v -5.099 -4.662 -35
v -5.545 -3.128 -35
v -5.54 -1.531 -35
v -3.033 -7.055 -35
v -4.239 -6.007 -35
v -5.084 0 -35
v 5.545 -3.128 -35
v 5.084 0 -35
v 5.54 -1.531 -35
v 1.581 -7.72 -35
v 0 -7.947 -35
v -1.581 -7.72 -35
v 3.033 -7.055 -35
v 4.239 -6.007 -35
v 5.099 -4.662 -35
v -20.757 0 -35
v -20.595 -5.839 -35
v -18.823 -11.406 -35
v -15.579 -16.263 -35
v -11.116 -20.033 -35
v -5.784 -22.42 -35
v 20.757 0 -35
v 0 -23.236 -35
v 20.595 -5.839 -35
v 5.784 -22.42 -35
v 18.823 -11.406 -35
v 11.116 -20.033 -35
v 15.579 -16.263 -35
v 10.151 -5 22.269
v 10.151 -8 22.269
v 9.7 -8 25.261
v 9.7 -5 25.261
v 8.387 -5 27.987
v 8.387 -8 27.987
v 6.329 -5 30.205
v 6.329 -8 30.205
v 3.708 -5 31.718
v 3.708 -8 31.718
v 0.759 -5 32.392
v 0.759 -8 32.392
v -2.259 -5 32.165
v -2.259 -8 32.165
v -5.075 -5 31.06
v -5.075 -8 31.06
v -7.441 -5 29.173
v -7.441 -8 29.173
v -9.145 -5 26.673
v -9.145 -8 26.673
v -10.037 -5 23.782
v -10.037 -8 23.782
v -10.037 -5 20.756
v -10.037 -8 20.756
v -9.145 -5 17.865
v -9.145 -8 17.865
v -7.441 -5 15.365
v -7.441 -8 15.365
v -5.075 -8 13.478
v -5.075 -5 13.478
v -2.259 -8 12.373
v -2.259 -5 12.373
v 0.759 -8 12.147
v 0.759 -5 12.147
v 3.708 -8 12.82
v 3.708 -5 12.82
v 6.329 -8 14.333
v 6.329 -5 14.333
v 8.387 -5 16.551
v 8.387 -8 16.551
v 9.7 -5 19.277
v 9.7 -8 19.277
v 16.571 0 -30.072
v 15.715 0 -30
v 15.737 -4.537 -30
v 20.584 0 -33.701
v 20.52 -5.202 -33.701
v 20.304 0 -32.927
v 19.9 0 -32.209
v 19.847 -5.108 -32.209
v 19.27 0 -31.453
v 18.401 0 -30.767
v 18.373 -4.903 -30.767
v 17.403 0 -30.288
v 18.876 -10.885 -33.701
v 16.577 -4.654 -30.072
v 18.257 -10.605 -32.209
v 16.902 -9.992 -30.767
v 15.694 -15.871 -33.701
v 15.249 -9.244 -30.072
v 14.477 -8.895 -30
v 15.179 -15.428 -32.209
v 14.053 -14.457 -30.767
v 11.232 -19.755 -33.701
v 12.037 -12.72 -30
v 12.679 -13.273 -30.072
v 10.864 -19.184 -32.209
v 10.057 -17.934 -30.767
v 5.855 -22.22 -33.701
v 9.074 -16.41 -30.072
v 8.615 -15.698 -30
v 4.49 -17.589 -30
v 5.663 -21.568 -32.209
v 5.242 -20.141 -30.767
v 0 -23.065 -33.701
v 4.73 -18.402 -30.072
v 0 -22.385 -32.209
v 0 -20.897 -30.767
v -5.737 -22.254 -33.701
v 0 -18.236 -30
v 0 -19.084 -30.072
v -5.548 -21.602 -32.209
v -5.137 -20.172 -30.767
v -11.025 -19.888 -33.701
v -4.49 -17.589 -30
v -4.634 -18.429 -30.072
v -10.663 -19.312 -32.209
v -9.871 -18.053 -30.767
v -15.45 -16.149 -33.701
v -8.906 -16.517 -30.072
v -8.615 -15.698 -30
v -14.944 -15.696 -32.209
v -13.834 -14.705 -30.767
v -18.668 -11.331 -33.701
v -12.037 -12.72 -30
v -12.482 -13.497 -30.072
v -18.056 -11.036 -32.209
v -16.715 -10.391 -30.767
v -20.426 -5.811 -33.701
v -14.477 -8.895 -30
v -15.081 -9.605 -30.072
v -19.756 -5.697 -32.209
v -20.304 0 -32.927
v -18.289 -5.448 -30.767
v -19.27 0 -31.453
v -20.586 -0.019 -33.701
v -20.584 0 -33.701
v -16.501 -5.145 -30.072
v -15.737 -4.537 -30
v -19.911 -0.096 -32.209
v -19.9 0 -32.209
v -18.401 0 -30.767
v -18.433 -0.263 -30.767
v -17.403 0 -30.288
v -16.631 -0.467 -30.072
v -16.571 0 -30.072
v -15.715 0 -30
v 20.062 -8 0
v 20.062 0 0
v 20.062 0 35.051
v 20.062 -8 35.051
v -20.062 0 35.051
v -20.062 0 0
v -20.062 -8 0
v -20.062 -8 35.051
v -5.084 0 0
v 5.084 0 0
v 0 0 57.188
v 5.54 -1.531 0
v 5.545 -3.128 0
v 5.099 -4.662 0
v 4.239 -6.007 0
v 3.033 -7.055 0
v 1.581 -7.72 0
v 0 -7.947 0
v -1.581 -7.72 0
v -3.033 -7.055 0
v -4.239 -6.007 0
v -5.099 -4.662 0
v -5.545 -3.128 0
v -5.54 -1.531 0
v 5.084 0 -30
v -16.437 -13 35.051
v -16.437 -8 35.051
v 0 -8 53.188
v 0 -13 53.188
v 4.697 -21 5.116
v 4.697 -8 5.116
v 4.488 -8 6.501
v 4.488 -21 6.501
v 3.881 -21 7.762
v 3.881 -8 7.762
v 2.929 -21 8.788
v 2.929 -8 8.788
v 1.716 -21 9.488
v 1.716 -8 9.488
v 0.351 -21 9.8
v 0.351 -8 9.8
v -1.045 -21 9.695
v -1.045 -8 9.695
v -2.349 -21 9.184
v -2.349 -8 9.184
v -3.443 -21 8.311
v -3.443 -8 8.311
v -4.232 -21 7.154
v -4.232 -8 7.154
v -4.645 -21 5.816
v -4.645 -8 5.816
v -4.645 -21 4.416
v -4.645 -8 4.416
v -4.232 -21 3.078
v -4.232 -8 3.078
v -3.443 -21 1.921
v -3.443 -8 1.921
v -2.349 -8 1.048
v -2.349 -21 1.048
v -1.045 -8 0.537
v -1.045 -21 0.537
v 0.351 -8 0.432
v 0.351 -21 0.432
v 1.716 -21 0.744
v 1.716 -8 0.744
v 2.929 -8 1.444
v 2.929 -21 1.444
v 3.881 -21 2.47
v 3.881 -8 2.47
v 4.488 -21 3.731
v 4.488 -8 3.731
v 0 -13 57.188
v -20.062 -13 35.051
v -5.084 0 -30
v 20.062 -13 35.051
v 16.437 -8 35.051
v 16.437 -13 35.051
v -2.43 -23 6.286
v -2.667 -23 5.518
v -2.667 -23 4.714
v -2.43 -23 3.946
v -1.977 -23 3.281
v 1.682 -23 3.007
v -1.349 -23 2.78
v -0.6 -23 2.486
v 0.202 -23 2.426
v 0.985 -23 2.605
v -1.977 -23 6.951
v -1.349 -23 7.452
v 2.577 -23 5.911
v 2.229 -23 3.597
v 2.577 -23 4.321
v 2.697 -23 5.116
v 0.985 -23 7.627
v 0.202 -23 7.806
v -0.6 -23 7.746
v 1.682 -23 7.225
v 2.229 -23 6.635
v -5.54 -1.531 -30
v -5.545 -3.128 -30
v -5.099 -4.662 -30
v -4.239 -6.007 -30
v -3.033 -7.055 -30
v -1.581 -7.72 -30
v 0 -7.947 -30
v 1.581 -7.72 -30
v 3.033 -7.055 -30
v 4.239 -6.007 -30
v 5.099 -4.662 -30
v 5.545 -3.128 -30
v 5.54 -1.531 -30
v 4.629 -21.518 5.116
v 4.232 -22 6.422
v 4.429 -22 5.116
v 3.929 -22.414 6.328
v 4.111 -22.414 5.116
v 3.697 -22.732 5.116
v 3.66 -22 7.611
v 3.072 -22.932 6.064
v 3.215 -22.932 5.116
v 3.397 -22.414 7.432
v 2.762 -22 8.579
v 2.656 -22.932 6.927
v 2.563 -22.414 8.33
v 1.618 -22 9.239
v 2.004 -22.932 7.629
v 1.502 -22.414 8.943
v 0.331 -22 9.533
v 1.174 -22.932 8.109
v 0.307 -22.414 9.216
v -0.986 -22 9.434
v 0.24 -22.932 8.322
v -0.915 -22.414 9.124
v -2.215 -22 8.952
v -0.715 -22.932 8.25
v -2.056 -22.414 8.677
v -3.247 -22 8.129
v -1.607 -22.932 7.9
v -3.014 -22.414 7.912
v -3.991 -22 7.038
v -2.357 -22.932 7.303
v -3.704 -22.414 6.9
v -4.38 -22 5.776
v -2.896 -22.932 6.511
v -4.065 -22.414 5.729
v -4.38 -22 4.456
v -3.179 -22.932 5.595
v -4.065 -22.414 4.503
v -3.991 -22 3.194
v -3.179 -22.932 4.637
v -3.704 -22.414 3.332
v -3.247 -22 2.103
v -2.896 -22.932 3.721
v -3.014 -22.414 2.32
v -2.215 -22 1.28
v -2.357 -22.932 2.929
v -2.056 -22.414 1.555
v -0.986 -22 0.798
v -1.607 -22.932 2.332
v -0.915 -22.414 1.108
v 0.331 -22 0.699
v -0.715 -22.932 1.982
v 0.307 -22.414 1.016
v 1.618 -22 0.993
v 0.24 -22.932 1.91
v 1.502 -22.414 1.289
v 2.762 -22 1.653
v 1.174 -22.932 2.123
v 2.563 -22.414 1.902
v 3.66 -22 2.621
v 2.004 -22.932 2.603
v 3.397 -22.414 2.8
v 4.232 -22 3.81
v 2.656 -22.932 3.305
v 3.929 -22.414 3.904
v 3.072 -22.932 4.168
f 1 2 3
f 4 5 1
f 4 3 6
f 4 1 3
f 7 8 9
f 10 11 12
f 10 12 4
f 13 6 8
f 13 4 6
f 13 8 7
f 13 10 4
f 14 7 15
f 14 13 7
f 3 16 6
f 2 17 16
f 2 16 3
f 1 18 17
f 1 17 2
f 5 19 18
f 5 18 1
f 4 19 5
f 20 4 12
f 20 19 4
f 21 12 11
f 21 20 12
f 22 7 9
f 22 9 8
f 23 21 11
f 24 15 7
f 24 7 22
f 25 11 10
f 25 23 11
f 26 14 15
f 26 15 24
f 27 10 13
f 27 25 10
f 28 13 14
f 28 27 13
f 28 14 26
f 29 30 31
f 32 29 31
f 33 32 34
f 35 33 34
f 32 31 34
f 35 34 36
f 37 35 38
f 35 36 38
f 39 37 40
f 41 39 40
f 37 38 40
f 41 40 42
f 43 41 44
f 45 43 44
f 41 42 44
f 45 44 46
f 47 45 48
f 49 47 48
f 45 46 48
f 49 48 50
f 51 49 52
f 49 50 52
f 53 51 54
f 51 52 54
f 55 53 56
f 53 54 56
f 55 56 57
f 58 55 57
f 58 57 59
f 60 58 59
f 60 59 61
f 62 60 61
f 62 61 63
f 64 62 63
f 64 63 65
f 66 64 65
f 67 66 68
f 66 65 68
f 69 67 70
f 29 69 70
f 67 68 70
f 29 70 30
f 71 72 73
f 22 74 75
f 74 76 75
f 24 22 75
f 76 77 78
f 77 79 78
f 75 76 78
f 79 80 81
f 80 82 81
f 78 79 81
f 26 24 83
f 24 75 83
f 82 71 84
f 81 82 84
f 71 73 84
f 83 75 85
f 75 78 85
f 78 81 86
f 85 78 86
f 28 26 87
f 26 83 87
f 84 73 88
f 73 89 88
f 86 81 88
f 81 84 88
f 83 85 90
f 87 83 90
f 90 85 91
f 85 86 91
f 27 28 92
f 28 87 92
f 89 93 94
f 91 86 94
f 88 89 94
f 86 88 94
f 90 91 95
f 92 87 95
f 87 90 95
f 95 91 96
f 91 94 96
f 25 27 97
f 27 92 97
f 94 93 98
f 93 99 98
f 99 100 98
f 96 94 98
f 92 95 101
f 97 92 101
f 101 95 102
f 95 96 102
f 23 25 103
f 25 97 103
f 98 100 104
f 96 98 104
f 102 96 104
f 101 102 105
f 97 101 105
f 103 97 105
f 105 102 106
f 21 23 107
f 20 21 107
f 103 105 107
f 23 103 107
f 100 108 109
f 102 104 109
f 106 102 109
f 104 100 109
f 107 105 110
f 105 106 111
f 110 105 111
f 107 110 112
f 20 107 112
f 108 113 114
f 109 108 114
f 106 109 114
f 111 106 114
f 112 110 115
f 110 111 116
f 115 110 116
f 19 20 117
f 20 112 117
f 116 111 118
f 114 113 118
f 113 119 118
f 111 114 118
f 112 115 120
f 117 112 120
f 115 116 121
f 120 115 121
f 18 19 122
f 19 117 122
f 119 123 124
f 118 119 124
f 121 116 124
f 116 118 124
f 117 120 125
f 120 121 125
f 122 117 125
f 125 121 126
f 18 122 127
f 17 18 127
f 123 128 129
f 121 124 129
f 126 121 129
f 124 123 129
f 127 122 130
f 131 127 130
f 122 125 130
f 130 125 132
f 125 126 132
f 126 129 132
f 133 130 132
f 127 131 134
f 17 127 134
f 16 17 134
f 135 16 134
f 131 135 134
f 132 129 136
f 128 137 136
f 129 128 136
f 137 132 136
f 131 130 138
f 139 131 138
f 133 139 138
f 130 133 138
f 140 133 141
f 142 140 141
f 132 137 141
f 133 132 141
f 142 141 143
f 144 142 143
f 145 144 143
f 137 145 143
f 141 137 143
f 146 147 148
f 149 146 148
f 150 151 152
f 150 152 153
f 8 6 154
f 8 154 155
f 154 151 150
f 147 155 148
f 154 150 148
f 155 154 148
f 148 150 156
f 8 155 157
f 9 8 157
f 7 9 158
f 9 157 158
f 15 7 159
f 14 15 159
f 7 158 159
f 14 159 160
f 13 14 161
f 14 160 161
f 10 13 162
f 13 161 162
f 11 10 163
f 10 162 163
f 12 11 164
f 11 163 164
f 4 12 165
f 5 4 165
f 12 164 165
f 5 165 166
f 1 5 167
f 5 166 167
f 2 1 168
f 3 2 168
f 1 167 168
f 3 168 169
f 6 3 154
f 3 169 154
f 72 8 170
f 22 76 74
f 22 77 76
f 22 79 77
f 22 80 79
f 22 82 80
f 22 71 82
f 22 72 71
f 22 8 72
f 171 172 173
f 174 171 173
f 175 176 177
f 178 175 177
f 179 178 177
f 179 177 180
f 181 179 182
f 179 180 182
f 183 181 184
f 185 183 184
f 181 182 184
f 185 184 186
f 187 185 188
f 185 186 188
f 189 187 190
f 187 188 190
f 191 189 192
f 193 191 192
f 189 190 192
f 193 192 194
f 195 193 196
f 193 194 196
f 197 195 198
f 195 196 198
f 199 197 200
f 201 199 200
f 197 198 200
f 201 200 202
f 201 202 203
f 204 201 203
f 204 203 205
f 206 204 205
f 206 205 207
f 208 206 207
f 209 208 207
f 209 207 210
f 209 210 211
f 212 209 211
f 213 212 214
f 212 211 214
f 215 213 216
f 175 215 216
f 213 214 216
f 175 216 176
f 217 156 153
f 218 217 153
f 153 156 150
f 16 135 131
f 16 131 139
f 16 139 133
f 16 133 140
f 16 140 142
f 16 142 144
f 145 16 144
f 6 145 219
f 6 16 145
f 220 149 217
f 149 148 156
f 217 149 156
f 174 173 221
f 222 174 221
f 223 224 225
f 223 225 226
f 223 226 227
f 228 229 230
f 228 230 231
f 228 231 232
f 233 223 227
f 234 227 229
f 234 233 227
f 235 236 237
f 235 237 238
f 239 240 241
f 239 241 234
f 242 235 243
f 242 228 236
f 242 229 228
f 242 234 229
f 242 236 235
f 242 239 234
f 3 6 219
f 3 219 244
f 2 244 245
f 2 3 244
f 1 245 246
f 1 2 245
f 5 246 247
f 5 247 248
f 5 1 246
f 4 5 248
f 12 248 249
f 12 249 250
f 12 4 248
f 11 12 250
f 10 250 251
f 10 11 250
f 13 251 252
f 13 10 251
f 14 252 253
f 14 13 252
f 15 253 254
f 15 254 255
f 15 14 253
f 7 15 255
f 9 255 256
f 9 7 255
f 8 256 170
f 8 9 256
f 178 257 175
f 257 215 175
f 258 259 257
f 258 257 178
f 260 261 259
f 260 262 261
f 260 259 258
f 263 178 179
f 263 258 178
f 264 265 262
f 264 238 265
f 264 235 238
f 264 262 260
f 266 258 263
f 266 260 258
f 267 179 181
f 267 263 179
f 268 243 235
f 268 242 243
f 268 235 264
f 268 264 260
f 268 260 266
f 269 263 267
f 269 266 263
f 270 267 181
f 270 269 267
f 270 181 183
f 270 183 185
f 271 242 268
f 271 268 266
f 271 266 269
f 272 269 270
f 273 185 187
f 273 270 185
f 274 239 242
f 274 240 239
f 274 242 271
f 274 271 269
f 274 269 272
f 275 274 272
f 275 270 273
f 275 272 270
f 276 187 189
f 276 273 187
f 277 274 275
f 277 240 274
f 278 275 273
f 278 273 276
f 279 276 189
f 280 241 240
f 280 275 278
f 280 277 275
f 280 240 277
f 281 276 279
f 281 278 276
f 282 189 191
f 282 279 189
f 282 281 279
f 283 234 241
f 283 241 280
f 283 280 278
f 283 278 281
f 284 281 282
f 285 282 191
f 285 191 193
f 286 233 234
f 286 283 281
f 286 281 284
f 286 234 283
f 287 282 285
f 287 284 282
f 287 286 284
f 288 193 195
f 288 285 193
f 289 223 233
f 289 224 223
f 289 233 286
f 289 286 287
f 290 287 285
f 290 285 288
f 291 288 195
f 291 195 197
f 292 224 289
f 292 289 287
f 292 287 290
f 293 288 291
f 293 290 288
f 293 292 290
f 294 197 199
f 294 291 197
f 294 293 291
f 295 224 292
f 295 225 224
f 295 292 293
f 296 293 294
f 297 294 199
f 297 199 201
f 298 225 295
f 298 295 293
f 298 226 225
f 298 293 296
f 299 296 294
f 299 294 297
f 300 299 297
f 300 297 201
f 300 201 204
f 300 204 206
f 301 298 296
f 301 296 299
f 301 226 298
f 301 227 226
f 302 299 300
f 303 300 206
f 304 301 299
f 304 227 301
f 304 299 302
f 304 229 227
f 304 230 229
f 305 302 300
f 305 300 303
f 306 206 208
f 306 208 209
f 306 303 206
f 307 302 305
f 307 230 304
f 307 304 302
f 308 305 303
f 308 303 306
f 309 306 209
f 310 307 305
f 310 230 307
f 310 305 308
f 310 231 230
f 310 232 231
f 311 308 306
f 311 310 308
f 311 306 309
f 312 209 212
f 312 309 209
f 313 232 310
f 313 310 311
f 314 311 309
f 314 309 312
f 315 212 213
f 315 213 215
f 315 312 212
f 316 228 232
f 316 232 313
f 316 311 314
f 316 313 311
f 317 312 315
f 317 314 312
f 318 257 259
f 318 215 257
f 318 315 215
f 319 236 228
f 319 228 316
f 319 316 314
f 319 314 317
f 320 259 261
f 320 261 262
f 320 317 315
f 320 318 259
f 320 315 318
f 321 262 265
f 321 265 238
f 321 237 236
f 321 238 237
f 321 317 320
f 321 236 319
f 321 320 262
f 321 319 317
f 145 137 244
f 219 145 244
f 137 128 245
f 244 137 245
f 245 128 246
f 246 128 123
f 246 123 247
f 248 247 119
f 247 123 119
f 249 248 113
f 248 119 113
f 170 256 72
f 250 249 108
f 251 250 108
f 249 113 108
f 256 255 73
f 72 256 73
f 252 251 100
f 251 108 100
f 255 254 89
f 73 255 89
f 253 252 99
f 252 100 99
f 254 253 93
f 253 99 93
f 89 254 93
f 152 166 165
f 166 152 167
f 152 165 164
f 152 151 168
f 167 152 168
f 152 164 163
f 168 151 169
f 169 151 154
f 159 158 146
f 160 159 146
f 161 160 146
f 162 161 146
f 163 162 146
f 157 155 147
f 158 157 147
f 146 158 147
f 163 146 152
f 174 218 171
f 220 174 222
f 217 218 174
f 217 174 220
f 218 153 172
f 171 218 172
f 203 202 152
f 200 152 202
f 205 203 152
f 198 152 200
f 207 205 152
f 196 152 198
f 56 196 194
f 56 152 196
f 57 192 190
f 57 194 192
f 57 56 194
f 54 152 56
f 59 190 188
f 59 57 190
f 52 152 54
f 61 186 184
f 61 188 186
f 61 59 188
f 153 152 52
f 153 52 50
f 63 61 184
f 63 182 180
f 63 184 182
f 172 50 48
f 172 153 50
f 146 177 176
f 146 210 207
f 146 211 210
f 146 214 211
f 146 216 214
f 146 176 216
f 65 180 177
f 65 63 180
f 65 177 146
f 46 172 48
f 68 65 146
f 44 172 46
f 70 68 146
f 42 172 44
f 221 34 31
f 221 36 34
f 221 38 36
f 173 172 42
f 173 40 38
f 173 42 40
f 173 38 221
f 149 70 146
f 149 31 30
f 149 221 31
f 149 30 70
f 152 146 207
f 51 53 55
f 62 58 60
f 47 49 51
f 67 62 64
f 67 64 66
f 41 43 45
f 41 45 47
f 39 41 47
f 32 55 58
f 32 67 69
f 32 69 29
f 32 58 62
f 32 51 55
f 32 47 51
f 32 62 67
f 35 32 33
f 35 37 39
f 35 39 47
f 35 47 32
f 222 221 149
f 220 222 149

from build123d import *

# Parameters (mm, degrees)
F0_W      = 20.0620945543
F0_H      = 35.0510179996
F1_DEPTH  = 8
F2_R      = 10.1507039691
F3_DEPTH  = 3
F4_R      = 4.6971638308
F5_DEPTH  = 15
F6_R      = 2
F8_DEPTH  = 35
F10_DEPTH = 5
F11_R     = 4.99999
F13_DEPTH = 5


# Not quite as in the source:
# - a fillet or chamfer is up to 0.001 mm smaller than in the source, because OpenCascade refuses the exact size


with BuildPart() as f1:
    # F0 (on Front) → F1 (new body)
    with BuildSketch(Plane.XZ):
        Polygon((0, 57.1884997189), (0, 35.0510179996), (20.0620945543, 35.0510179996), align=None)
        Polygon((-20.0620945543, 35.0510179996), (0, 35.0510179996), (0, 57.1884997189), align=None)
        with Locations((-10.0310472772, 17.5255089998)):
            Rectangle(F0_W, F0_H)
        with Locations((10.0310472772, 17.5255089998)):
            Rectangle(F0_W, F0_H)
    extrude(amount=F1_DEPTH)

    # F2 (on face) → F3 (cut)
    with BuildSketch(Plane.XZ.offset(8)):
        with Locations((0, 22.2692545503)):
            Circle(F2_R)
    extrude(amount=-F3_DEPTH, mode=Mode.SUBTRACT)

    # F4 (on face) → F5 (join)
    with BuildSketch(Plane.XZ.offset(8)):
        with Locations((0, 5.1159886643)):
            Circle(F4_R)
    extrude(amount=F5_DEPTH)

    # F6
    f6_edges = [f1.edges().sort_by_distance(p)[0] for p in [
        (-4.697164, -23, 5.115989),
    ]]
    fillet(f6_edges, radius=F6_R)

    # F7 (on face) → F8 (join)
    with BuildSketch(Plane(origin=(0, 0, 0), x_dir=(1, 0, 0), z_dir=(0, 0, -1))):
        with BuildLine():
            Line((-5.0843584387, 0), (5.0843584387, 0))
            ThreePointArc((5.0843584387, 0), (0, 7.9473265145), (-5.0843584387, 0))
        make_face()
    extrude(amount=F8_DEPTH)

    # F12 (on face) → F13 (join)
    with BuildSketch(Plane.XZ.offset(8)):
        Polygon((0, 57.1884997189), (-20.0620945543, 35.0510179996), (-16.4370942388, 35.0510179996), (0, 53.1884997189), (16.4370942388, 35.0510179996), (20.0620945543, 35.0510179996), align=None)
    extrude(amount=F13_DEPTH)


with BuildPart() as f10:
    # F9 (on face) → F10 (new body)
    with BuildSketch(Plane(origin=(0, 0, -35), x_dir=(1, 0, 0), z_dir=(0, 0, -1))):
        with BuildLine():
            Line((5.0843584387, 0), (20.7567422331, 0))
            ThreePointArc((20.7567422331, 0), (0, 23.2363286774), (-20.7567422331, 0))
            Line((-20.7567422331, 0), (-5.0843584387, 0))
            ThreePointArc((-5.0843584387, 0), (0, 7.9473265145), (5.0843584387, 0))
        make_face()
    extrude(amount=-F10_DEPTH)

    # F11 (radius 5 in the source; OpenCascade refuses exactly that, so slightly less here)
    f11_edges = [f10.edges().sort_by_distance(p)[0] for p in [
        (0, -23.236329, -30),
    ]]
    fillet(f11_edges, radius=F11_R)


solid = Compound([f1.part, f10.part])
